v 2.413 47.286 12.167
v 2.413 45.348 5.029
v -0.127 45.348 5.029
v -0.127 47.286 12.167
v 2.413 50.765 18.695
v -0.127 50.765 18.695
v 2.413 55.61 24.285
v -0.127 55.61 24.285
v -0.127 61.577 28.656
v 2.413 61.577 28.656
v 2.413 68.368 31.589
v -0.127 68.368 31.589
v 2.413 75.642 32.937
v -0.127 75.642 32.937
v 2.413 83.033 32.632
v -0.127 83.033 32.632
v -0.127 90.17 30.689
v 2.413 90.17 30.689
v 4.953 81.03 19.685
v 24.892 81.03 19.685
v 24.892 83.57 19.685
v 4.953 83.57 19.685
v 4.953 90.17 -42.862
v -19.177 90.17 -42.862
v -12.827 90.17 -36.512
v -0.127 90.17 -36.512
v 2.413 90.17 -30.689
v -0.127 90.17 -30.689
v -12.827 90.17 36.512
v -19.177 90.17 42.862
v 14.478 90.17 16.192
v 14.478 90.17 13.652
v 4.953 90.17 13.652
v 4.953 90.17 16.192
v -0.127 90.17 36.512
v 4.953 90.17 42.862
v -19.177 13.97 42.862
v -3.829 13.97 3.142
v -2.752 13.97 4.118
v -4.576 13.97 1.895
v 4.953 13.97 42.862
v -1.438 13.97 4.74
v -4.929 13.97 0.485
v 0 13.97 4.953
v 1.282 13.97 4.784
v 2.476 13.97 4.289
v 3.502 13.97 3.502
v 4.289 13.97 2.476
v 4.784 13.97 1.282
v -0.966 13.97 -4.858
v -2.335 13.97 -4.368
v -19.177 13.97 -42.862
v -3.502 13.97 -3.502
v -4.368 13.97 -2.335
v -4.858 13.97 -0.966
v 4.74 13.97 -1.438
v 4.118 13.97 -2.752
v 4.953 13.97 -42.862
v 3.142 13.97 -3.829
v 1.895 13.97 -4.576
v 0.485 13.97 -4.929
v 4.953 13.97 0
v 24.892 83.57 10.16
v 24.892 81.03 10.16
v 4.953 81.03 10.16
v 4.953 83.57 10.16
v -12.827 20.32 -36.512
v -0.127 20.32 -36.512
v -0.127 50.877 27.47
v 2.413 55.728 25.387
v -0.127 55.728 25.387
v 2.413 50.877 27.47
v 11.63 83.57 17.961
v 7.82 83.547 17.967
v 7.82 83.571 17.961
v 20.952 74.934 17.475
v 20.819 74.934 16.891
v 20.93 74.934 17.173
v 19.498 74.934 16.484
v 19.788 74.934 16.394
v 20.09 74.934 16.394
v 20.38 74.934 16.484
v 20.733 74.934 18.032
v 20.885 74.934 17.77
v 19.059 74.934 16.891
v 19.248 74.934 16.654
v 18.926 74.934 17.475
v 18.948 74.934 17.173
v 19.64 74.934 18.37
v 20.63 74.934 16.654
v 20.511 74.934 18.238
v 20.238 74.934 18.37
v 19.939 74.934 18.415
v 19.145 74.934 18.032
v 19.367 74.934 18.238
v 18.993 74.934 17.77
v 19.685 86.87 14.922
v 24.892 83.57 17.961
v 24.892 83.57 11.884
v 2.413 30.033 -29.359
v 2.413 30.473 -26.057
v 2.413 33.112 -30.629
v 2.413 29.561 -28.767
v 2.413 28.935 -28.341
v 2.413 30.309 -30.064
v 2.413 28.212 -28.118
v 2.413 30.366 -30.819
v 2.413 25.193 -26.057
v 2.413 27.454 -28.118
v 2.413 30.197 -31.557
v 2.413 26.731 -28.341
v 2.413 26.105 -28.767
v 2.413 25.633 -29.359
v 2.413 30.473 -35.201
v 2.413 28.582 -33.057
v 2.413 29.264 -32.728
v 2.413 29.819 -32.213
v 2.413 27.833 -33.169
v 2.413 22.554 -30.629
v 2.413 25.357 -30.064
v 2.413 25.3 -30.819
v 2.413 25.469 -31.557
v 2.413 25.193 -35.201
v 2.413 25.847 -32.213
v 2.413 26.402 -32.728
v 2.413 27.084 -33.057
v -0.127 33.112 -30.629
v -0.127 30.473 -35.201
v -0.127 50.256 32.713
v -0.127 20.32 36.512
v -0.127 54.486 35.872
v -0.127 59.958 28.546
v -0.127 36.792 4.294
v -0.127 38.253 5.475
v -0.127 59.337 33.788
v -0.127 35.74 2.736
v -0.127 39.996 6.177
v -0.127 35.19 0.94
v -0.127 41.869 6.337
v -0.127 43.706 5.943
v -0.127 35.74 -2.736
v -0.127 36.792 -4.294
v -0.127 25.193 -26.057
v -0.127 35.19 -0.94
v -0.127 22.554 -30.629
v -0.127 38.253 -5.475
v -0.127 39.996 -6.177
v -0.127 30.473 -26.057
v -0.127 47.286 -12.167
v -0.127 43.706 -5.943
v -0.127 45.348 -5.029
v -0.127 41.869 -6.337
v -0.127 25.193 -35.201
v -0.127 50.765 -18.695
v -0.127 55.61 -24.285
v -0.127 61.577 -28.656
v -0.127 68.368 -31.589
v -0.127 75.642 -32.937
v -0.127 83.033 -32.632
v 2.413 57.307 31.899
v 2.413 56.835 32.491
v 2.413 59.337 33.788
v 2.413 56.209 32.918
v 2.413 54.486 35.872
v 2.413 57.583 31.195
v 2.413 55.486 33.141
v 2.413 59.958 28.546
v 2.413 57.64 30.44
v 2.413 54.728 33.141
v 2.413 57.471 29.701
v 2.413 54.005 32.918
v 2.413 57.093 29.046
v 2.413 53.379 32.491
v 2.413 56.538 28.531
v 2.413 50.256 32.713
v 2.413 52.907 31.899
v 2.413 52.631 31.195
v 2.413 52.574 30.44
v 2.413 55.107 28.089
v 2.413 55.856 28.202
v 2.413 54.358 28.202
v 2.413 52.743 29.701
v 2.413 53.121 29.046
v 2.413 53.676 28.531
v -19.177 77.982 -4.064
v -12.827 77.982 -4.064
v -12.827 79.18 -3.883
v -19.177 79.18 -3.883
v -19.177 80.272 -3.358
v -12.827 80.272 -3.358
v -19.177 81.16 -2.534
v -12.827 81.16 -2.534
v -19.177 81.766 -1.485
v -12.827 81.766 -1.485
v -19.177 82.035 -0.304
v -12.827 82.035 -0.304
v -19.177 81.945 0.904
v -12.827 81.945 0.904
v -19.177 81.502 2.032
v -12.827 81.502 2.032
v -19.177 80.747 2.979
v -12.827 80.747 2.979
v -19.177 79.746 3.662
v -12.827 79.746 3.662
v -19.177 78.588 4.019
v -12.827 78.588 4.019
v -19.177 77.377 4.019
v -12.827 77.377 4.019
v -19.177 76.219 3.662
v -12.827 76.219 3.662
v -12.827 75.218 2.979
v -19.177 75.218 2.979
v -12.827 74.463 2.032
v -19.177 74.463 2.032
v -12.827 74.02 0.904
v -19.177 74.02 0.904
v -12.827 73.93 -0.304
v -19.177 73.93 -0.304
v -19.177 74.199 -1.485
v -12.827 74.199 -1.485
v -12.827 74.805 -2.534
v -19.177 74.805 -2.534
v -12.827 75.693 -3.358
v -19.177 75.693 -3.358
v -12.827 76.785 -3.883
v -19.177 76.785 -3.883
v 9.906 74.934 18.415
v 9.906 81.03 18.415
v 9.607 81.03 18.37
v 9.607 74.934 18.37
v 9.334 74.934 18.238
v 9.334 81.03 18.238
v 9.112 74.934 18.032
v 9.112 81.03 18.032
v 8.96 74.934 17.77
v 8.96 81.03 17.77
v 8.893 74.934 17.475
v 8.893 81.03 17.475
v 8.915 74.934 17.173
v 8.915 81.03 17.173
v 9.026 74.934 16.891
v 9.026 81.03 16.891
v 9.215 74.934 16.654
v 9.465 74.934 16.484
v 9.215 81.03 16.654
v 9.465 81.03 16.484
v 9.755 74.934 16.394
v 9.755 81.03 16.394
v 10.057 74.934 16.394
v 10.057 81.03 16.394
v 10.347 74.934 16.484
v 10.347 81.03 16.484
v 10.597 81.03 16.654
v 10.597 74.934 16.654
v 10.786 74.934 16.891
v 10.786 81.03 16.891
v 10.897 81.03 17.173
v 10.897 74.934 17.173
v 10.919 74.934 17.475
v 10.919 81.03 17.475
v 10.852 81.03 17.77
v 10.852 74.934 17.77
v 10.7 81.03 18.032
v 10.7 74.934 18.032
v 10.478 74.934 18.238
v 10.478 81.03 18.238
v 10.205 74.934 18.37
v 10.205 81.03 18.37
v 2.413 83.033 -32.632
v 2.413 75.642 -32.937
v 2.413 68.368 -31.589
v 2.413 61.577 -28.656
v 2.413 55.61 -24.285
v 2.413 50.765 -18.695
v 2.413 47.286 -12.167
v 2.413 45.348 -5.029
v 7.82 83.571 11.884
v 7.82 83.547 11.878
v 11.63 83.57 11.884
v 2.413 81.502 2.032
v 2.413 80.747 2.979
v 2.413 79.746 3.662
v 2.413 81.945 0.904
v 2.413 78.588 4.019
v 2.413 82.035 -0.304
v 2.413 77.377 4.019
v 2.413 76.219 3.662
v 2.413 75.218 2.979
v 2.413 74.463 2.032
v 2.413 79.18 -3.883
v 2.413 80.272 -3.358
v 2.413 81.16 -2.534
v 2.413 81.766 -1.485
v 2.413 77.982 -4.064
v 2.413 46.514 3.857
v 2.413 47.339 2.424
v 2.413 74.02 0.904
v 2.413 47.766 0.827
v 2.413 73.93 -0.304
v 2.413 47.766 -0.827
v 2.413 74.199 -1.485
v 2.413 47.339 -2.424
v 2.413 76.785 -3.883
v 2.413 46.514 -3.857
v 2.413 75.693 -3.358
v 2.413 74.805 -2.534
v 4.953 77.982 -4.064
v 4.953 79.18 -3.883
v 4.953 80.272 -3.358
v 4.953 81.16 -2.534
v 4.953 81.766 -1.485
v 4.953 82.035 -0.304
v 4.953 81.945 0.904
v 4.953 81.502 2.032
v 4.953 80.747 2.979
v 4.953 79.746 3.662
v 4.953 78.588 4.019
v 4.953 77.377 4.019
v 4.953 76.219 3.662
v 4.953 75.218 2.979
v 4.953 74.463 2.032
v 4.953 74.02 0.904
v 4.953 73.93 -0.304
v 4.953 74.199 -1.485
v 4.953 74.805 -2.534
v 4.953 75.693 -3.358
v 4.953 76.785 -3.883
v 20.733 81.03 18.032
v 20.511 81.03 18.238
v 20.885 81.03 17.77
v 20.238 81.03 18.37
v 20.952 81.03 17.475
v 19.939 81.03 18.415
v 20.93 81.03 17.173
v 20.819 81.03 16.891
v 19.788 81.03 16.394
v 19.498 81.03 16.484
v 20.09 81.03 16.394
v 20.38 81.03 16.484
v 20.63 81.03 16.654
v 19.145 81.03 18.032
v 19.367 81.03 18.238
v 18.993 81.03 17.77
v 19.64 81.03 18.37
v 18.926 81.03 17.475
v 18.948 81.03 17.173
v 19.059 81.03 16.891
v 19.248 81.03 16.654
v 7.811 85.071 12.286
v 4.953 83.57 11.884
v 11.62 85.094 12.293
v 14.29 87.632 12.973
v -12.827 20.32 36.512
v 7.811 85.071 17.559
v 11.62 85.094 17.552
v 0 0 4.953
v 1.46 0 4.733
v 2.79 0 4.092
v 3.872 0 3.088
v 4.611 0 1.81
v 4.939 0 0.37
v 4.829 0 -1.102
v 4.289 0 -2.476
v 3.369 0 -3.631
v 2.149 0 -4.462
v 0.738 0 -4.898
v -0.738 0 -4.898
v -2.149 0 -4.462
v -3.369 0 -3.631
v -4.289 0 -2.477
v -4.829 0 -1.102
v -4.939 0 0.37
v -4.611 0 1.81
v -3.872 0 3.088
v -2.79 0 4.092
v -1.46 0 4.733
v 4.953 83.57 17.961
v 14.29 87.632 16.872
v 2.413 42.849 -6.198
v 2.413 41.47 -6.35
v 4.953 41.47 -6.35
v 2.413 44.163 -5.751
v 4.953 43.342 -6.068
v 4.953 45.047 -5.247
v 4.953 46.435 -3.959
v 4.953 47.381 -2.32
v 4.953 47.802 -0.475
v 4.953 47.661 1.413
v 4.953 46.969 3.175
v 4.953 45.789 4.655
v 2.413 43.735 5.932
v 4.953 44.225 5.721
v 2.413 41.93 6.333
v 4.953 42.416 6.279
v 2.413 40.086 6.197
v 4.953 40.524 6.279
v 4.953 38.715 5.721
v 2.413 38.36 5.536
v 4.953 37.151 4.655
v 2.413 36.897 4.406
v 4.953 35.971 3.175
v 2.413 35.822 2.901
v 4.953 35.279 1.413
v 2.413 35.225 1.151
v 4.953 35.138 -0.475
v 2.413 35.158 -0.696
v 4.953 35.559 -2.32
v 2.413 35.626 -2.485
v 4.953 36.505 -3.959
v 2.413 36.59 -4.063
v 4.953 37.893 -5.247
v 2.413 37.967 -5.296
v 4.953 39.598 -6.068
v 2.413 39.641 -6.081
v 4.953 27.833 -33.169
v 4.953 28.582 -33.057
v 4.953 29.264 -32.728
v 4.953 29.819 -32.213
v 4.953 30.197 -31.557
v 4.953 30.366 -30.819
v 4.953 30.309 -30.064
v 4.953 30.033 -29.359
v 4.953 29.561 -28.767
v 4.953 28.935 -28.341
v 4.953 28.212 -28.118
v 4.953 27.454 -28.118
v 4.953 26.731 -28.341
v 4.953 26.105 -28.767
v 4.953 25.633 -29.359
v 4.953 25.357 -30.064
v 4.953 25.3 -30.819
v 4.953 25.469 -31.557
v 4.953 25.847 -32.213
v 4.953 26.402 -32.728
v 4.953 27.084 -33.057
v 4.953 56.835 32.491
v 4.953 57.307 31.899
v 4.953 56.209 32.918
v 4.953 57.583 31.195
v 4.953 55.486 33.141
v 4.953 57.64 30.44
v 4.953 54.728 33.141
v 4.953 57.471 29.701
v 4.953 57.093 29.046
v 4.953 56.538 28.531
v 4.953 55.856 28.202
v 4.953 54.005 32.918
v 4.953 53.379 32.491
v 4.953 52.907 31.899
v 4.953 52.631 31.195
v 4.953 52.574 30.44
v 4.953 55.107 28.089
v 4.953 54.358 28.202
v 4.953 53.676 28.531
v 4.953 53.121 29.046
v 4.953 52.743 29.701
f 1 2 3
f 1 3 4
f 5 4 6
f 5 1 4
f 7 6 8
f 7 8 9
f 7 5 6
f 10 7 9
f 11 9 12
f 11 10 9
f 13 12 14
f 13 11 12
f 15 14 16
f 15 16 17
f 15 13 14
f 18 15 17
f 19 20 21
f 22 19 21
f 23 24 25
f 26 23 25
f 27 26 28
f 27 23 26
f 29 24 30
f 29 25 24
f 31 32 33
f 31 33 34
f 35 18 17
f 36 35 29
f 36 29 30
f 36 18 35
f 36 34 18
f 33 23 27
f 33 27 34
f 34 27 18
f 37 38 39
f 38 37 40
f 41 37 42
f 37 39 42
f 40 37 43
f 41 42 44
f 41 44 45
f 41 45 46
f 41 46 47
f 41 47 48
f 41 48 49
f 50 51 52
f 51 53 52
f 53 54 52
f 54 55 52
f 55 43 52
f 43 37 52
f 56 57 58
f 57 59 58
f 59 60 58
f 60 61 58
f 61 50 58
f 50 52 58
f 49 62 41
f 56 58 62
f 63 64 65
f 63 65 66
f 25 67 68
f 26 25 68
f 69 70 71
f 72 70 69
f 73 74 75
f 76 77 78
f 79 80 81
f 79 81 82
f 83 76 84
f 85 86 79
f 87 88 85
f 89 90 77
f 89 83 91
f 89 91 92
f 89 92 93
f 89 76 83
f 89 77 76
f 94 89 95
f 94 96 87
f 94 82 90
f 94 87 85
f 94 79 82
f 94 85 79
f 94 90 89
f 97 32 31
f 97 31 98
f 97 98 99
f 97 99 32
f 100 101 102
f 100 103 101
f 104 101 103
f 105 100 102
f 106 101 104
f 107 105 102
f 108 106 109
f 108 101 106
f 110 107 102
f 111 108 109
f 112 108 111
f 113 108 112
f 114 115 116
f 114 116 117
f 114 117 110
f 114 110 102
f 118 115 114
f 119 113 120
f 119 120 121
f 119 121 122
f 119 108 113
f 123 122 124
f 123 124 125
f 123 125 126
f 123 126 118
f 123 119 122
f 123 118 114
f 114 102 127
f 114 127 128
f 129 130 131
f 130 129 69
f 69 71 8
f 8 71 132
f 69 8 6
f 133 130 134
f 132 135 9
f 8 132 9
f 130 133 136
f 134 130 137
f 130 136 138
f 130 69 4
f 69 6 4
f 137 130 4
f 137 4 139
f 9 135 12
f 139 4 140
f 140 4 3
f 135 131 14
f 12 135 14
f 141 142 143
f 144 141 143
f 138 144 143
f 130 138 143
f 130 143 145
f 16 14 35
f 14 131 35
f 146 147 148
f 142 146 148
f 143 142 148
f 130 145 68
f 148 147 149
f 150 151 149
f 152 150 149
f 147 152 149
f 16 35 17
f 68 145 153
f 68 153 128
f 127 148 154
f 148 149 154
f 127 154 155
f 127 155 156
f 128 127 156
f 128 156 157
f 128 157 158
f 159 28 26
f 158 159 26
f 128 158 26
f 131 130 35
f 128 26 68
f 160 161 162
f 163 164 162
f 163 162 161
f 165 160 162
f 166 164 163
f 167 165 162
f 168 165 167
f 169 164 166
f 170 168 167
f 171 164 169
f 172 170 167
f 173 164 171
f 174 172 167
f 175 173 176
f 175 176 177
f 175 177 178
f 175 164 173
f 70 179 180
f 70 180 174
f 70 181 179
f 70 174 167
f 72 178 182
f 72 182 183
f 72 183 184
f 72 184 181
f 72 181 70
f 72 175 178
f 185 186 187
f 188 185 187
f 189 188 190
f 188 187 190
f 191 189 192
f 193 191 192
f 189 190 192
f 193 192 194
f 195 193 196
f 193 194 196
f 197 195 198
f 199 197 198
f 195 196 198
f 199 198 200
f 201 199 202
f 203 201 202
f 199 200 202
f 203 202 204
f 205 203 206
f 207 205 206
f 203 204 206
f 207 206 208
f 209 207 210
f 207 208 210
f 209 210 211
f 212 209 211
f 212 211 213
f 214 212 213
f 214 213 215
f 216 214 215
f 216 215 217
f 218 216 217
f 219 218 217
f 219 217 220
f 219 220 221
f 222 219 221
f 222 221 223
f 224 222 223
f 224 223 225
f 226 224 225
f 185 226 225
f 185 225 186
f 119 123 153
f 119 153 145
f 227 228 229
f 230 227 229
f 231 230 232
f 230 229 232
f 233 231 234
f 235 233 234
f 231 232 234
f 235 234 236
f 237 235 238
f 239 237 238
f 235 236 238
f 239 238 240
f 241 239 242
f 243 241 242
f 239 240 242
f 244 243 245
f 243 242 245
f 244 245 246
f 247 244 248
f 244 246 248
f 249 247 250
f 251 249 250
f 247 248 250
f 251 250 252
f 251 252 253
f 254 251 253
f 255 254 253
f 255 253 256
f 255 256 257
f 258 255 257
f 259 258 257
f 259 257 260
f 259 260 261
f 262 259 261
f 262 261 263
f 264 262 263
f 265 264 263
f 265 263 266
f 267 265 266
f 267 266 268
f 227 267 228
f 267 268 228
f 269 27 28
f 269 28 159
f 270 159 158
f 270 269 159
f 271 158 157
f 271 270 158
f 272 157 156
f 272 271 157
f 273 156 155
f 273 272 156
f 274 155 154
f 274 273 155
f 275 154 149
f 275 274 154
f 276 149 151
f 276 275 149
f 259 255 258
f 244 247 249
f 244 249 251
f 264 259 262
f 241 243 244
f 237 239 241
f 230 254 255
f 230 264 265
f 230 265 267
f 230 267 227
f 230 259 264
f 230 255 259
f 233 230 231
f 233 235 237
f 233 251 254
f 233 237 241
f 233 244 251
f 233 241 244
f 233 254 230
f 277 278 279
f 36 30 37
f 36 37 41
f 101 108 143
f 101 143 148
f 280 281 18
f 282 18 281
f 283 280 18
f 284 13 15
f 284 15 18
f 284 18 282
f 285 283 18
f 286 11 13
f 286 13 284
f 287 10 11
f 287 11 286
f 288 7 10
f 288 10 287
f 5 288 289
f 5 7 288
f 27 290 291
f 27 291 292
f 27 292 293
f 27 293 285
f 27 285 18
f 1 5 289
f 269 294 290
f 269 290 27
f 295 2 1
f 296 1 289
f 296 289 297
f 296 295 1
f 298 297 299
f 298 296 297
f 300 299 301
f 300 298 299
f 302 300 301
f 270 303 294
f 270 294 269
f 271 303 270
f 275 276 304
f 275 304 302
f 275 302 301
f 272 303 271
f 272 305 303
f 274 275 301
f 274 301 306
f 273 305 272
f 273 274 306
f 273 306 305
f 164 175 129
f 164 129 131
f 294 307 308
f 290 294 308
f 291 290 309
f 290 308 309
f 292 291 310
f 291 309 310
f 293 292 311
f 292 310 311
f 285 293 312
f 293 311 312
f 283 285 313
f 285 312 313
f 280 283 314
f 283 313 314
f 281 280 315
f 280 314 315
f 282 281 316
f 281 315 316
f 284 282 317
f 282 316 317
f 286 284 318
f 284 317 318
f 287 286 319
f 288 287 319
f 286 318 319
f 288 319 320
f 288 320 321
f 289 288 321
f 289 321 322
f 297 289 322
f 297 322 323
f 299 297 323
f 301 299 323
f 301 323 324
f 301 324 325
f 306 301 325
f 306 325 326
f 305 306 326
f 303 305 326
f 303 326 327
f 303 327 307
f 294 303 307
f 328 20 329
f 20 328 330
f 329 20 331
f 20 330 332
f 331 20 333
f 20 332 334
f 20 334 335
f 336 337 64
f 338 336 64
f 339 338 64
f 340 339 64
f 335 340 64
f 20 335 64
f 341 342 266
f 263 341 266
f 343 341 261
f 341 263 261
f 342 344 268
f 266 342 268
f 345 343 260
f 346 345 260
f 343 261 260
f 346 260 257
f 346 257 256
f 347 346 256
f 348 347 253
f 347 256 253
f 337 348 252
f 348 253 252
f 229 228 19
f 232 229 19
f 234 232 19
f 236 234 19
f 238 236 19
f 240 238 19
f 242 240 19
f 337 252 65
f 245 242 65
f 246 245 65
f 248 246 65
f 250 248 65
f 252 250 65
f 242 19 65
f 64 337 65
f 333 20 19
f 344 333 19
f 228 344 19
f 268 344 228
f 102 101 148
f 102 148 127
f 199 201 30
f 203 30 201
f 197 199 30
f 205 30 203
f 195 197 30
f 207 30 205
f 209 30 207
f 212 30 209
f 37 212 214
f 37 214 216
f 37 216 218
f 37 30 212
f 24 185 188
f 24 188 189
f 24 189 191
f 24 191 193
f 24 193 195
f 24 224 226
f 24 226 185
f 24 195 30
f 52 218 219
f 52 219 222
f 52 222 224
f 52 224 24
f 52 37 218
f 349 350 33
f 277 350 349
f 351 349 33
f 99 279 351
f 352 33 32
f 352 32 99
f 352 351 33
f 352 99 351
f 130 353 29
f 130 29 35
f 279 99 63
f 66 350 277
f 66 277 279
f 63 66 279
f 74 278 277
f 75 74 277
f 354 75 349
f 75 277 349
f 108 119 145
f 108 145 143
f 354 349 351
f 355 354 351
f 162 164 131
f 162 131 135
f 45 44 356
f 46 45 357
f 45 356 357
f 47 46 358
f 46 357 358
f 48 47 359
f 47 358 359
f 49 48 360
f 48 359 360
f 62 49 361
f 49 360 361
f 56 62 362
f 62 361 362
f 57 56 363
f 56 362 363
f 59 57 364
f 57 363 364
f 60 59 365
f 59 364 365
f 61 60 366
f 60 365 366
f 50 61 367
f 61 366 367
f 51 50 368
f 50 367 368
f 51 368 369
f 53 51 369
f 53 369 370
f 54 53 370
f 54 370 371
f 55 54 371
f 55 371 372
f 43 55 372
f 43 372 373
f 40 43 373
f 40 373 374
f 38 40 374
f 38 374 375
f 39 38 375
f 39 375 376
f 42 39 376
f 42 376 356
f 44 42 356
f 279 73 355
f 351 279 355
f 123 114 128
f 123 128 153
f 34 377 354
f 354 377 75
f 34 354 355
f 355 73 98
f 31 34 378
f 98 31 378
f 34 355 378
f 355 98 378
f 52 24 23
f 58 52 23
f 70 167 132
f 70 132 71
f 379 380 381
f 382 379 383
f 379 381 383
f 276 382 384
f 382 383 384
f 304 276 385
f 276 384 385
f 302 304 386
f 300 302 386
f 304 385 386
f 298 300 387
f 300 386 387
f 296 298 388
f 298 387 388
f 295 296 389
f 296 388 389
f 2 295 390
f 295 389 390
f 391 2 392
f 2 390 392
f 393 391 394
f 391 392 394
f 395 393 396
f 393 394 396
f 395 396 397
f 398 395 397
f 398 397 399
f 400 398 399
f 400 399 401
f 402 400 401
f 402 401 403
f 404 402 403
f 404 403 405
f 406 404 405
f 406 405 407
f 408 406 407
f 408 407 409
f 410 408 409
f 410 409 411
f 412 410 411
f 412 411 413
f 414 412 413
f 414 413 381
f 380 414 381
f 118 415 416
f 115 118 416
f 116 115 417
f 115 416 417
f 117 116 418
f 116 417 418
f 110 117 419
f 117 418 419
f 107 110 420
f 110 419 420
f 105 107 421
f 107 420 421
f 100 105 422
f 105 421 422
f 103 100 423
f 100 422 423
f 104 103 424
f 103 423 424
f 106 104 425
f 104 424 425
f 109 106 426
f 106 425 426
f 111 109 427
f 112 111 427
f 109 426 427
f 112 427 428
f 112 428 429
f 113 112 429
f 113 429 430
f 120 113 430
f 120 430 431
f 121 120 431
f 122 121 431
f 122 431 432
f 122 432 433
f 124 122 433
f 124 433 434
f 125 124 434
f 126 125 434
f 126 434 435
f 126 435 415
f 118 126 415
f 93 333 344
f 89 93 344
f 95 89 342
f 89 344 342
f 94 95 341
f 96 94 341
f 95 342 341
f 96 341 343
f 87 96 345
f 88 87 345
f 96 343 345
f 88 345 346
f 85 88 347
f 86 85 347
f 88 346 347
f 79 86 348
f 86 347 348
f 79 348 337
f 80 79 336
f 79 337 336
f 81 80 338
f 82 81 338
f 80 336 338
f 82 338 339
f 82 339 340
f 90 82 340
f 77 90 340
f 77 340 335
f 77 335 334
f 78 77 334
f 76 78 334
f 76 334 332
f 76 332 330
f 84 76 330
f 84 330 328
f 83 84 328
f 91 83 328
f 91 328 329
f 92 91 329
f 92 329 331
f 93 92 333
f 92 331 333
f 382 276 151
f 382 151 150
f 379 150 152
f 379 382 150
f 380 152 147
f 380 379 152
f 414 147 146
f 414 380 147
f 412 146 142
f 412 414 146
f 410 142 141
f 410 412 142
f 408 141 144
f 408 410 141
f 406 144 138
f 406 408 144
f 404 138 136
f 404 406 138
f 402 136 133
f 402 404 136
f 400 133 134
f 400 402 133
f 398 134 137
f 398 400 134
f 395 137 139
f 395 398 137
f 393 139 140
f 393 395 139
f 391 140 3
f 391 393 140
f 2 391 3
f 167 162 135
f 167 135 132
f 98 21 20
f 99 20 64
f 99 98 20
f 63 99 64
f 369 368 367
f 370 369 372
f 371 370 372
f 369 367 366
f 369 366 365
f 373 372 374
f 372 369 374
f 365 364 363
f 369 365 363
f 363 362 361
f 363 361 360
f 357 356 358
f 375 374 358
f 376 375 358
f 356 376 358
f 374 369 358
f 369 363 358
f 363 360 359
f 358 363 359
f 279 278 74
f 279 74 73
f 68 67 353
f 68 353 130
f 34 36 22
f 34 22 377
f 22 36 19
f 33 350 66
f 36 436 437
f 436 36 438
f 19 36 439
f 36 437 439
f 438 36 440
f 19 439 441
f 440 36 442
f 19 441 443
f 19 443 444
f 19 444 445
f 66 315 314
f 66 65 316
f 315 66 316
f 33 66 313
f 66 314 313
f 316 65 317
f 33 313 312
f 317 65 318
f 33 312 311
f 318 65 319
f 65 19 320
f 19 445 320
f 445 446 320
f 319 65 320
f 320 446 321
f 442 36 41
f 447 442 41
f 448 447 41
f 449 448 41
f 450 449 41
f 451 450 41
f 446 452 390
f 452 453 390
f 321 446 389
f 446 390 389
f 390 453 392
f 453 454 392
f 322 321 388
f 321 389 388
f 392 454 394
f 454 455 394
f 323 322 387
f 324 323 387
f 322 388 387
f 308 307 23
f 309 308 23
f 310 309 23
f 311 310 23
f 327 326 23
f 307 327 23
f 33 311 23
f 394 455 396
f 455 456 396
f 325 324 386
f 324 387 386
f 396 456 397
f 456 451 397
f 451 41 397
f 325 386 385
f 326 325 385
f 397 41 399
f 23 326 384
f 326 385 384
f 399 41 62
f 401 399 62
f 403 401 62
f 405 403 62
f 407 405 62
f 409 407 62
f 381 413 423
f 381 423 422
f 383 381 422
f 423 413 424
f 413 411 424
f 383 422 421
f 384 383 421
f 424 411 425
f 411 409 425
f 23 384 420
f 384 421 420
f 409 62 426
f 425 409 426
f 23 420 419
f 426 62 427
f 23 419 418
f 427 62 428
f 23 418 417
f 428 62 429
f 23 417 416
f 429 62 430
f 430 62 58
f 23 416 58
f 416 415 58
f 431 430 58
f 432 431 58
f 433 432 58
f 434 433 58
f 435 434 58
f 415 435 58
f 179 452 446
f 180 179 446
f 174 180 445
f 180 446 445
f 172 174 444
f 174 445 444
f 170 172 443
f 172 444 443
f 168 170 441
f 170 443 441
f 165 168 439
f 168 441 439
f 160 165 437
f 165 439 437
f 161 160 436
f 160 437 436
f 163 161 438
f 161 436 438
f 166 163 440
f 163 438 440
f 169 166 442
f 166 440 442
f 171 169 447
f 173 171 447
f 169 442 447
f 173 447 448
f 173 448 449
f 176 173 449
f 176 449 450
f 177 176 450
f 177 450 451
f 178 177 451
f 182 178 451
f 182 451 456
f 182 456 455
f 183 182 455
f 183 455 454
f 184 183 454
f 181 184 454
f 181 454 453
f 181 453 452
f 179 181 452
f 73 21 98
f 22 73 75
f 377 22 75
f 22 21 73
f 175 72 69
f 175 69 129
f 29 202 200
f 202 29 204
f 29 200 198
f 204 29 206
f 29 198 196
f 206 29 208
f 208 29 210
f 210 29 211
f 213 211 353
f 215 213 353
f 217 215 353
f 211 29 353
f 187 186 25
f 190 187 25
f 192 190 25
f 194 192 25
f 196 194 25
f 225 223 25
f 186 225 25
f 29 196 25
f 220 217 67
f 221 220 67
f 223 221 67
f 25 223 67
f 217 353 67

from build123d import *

# Parameters (mm, degrees)
SKETCH3_R                      = 4.953
POST_DEPTH                     = 13.97
SKETCH4_W                      = 24.13
SKETCH4_H                      = 85.725
BASE_DEPTH                     = 6.35
SKETCH5_W                      = 24.13
SKETCH5_H                      = 85.725
SKETCH5_W_2                    = 15.24
SKETCH5_H_2                    = 73.025
CAVITY_DEPTH                   = 69.85
MOTORHOLES_REACH               = 104.714
SKETCH8_R                      = 6.35
SKETCH8_R_2                    = 2.54
POWERSCREWHOLES_REACH          = 104.714
SKETCH7_R                      = 4.064
NUT_SOCKET_DEPTH               = 2.54
SKETCH12_W                     = 9.525
SKETCH12_H                     = 2.54
LIMITSWITCHSUPPORT_DEPTH       = 19.939
SKETCH20_R                     = 1.016
BOSS_EXTRUDE3_DEPTH            = 6.096
ZIPTIECUTOUT_REACH             = 106.211
SKETCH22_W                     = 3.81
SKETCH22_H                     = 1.524
ZIPTIECUTOUT_DIRECTION_2_REACH = 106.211


with BuildPart() as part:
    # Sketch3 → Post (new body)
    with BuildSketch(Plane(origin=(0, 0, 0), x_dir=(1, 0, 0), z_dir=(0, 1, 0))):
        with Locations(Location((0, 0, 0), (0, 0, 270))):
            Circle(SKETCH3_R)
    extrude(amount=POST_DEPTH)

    # Sketch4 → Base (add)
    with BuildSketch(Plane(origin=(0, 13.97, 0), x_dir=(1, 0, 0), z_dir=(0, 1, 0))):
        with Locations((-7.112, 0)):
            Rectangle(SKETCH4_W, SKETCH4_H)
    extrude(amount=BASE_DEPTH)

    # Sketch5 → Cavity (add)
    with BuildSketch(Plane(origin=(0, 20.32, 0), x_dir=(1, 0, 0), z_dir=(0, 1, 0))):
        with Locations((-7.112, 0)):
            Rectangle(SKETCH5_W, SKETCH5_H)
        with Locations((-5.207, 0)):
            Rectangle(SKETCH5_W_2, SKETCH5_H_2, mode=Mode.SUBTRACT)
    extrude(amount=CAVITY_DEPTH)

    # Sketch8 → MotorHoles (cut, up to next)
    with BuildSketch(Plane(origin=(4.953, 0, 0), x_dir=(0, 0, -1), z_dir=(1, 0, 0)), mode=Mode.PRIVATE) as motorholes_sk1:
        with Locations((0, 41.47)):
            Circle(SKETCH8_R)
    motorholes_tool1 = extrude(motorholes_sk1.sketch, amount=-MOTORHOLES_REACH, mode=Mode.PRIVATE) & part.part
    # Sketch8 → MotorHoles (cut, up to next)
    with BuildSketch(Plane(origin=(4.953, 0, 0), x_dir=(0, 0, -1), z_dir=(1, 0, 0)), mode=Mode.PRIVATE) as motorholes_sk2:
        with Locations((-30.629352104, 55.107066169)):
            Circle(SKETCH8_R_2)
    motorholes_tool2 = extrude(motorholes_sk2.sketch, amount=-MOTORHOLES_REACH, mode=Mode.PRIVATE) & part.part
    # Sketch8 → MotorHoles (cut, up to next)
    with BuildSketch(Plane(origin=(4.953, 0, 0), x_dir=(0, 0, -1), z_dir=(1, 0, 0)), mode=Mode.PRIVATE) as motorholes_sk3:
        with Locations((30.629352104, 27.832933831)):
            Circle(SKETCH8_R_2)
    motorholes_tool3 = extrude(motorholes_sk3.sketch, amount=-MOTORHOLES_REACH, mode=Mode.PRIVATE) & part.part
    add(motorholes_tool1.solids().sort_by_distance((4.953, 41.47, 0))[0], mode=Mode.SUBTRACT)
    add(motorholes_tool2.solids().sort_by_distance((4.953, 55.107066, 30.629352))[0], mode=Mode.SUBTRACT)
    add(motorholes_tool3.solids().sort_by_distance((4.953, 27.832934, -30.629352))[0], mode=Mode.SUBTRACT)

    # PowerscrewHoles: up to this face of the body (flat: up to its plane)
    powerscrewholes_end = Plane(part.part.faces().sort_by_distance((-19.177, 52.07, 0))[0])
    # Sketch7 → PowerscrewHoles (cut, up to the picked face)
    with BuildSketch(Plane(origin=(4.953, 0, 0), x_dir=(0, 0, -1), z_dir=(1, 0, 0)), mode=Mode.PRIVATE) as powerscrewholes_sk1:
        with Locations((0, 77.9825)):
            Circle(SKETCH7_R)
    powerscrewholes_tool1 = split(extrude(powerscrewholes_sk1.sketch, amount=-POWERSCREWHOLES_REACH, mode=Mode.PRIVATE), bisect_by=powerscrewholes_end, keep=Keep.BOTH, mode=Mode.PRIVATE)
    add(powerscrewholes_tool1.solids().sort_by(Axis((4.953, 77.9825, 0), (-1, 0, 0)))[0], mode=Mode.SUBTRACT)

    # Sketch10 → Nut Socket (add)
    with BuildSketch(Plane.ZY.offset(-2.413)):
        with BuildLine():
            Line((-36.5125, 90.17), (-30.688519739, 90.17))
            ThreePointArc((-30.688519739, 90.17), (-28.656384533, 61.577256158), (-5.028558234, 45.347641304))
            ThreePointArc((-5.028558234, 45.347641304), (0, 35.12), (5.028558234, 45.347641304))
            ThreePointArc((5.028558234, 45.347641304), (28.656384533, 61.577256158), (30.688519739, 90.17))
            Line((30.688519739, 90.17), (36.5125, 90.17))
            Line((36.5125, 90.17), (36.5125, 20.32))
            Line((36.5125, 20.32), (-36.5125, 20.32))
            Line((-36.5125, 20.32), (-36.5125, 90.17))
        make_face()
        Polygon((-26.057352104, 30.472579262), (-30.629352104, 33.112224692), (-35.201352104, 30.472579262), (-35.201352104, 25.1932884), (-30.629352104, 22.553642969), (-26.057352104, 25.1932884), align=None, mode=Mode.SUBTRACT)
        Polygon((32.712972872, 50.256351119), (35.872004948, 54.486177161), (33.788384179, 59.336892211), (28.545731335, 59.957781219), (25.38669926, 55.727955177), (27.470320028, 50.877240127), align=None, mode=Mode.SUBTRACT)
    extrude(amount=NUT_SOCKET_DEPTH)

    # Sketch12 → LimitSwitchSupport (add)
    with BuildSketch(Plane(origin=(4.953, 0, 0), x_dir=(0, 0, -1), z_dir=(1, 0, 0))):
        with Locations((-14.9225, 82.3005)):
            Rectangle(SKETCH12_W, SKETCH12_H)
    extrude(amount=LIMITSWITCHSUPPORT_DEPTH)

    # Rib2: read off the stored shape, not the designer's step
    # Rib2: loft between two sections, ruled curve by curve
    rib2_from = [
        Edge.make_line((14.478, 90.17, 13.6525), (14.478, 90.17, 16.1925)),
        Edge.make_line((4.953, 90.17, 16.1925), (14.478, 90.17, 16.1925)),
        Edge.make_line((4.953, 90.17, 13.6525), (14.478, 90.17, 13.6525)),
        Edge.make_line((4.953, 90.17, 13.6525), (4.953, 90.17, 16.1925)),
    ]
    rib2_to = [
        Edge.make_line((24.892, 83.5705, 11.884169305), (24.892, 83.5705, 17.960830695)),
        Edge.make_line((4.953, 83.5705, 17.960830695), (24.892, 83.5705, 17.960830695)),
        Edge.make_line((4.953, 83.5705, 11.884169305), (24.892, 83.5705, 11.884169305)),
        Edge.make_line((4.953, 83.5705, 11.884169305), (4.953, 83.5705, 17.960830695)),
    ]
    rib2 = Solid(Shell([*[Face.make_surface_from_curves(rib2_from[k], rib2_to[k]) for k in range(4)], Face(Wire(rib2_from)), Face(Wire(rib2_to))]))
    add(rib2)

    # Sketch20 → Boss-Extrude3 (add)
    with BuildSketch(Plane.XZ.offset(-81.0305)):
        with Locations(Location((9.906, 17.399, 0), (0, 0, 90))):
            Circle(SKETCH20_R)
        with Locations(Location((19.939, 17.399, 0), (0, 0, 90))):
            Circle(SKETCH20_R)
    extrude(amount=BOSS_EXTRUDE3_DEPTH)

    # ZipTieCutout: up to this plane
    ziptiecutout_end = Plane(origin=(2.8575, 90.17, 13.6525), z_dir=(0, -0.25881904510252135, 0.9659258262890681))
    # Sketch22 → ZipTieCutout (cut, up to the surface)
    with BuildSketch(Plane(origin=(0, 7.096196959, 14.9225), x_dir=(0.9999812488409504, 0.00612388491835337, 0), z_dir=(0, 0, 1)), mode=Mode.PRIVATE) as ziptiecutout_sk1:
        with Locations((10.192898839, 77.16364952)):
            Rectangle(SKETCH22_W, SKETCH22_H)
    ziptiecutout_tool1 = split(extrude(ziptiecutout_sk1.sketch, amount=-ZIPTIECUTOUT_REACH, mode=Mode.PRIVATE), bisect_by=ziptiecutout_end, keep=Keep.BOTH, mode=Mode.PRIVATE)
    add(ziptiecutout_tool1.solids().sort_by_distance((9.720166, 84.32082, 14.9225))[0], mode=Mode.SUBTRACT)

    # ZipTieCutout direction 2: up to this plane
    ziptiecutout_direction_2_end = Plane(origin=(2.8575, 90.17, 16.1925), z_dir=(0, 0.25881904510252135, 0.9659258262890681))
    # Sketch22 → ZipTieCutout direction 2 (cut, up to the surface)
    with BuildSketch(Plane(origin=(0, 7.096196959, 14.9225), x_dir=(0.9999812488409504, 0.00612388491835337, 0), z_dir=(0, 0, 1)), mode=Mode.PRIVATE) as ziptiecutout_direction_2_sk1:
        with Locations((10.192898839, 77.16364952)):
            Rectangle(SKETCH22_W, SKETCH22_H)
    ziptiecutout_direction_2_tool1 = split(extrude(ziptiecutout_direction_2_sk1.sketch, amount=ZIPTIECUTOUT_DIRECTION_2_REACH, mode=Mode.PRIVATE), bisect_by=ziptiecutout_direction_2_end, keep=Keep.BOTH, mode=Mode.PRIVATE)
    add(ziptiecutout_direction_2_tool1.solids().sort_by_distance((9.720166, 84.32082, 14.9225))[0], mode=Mode.SUBTRACT)


solid = part.part
